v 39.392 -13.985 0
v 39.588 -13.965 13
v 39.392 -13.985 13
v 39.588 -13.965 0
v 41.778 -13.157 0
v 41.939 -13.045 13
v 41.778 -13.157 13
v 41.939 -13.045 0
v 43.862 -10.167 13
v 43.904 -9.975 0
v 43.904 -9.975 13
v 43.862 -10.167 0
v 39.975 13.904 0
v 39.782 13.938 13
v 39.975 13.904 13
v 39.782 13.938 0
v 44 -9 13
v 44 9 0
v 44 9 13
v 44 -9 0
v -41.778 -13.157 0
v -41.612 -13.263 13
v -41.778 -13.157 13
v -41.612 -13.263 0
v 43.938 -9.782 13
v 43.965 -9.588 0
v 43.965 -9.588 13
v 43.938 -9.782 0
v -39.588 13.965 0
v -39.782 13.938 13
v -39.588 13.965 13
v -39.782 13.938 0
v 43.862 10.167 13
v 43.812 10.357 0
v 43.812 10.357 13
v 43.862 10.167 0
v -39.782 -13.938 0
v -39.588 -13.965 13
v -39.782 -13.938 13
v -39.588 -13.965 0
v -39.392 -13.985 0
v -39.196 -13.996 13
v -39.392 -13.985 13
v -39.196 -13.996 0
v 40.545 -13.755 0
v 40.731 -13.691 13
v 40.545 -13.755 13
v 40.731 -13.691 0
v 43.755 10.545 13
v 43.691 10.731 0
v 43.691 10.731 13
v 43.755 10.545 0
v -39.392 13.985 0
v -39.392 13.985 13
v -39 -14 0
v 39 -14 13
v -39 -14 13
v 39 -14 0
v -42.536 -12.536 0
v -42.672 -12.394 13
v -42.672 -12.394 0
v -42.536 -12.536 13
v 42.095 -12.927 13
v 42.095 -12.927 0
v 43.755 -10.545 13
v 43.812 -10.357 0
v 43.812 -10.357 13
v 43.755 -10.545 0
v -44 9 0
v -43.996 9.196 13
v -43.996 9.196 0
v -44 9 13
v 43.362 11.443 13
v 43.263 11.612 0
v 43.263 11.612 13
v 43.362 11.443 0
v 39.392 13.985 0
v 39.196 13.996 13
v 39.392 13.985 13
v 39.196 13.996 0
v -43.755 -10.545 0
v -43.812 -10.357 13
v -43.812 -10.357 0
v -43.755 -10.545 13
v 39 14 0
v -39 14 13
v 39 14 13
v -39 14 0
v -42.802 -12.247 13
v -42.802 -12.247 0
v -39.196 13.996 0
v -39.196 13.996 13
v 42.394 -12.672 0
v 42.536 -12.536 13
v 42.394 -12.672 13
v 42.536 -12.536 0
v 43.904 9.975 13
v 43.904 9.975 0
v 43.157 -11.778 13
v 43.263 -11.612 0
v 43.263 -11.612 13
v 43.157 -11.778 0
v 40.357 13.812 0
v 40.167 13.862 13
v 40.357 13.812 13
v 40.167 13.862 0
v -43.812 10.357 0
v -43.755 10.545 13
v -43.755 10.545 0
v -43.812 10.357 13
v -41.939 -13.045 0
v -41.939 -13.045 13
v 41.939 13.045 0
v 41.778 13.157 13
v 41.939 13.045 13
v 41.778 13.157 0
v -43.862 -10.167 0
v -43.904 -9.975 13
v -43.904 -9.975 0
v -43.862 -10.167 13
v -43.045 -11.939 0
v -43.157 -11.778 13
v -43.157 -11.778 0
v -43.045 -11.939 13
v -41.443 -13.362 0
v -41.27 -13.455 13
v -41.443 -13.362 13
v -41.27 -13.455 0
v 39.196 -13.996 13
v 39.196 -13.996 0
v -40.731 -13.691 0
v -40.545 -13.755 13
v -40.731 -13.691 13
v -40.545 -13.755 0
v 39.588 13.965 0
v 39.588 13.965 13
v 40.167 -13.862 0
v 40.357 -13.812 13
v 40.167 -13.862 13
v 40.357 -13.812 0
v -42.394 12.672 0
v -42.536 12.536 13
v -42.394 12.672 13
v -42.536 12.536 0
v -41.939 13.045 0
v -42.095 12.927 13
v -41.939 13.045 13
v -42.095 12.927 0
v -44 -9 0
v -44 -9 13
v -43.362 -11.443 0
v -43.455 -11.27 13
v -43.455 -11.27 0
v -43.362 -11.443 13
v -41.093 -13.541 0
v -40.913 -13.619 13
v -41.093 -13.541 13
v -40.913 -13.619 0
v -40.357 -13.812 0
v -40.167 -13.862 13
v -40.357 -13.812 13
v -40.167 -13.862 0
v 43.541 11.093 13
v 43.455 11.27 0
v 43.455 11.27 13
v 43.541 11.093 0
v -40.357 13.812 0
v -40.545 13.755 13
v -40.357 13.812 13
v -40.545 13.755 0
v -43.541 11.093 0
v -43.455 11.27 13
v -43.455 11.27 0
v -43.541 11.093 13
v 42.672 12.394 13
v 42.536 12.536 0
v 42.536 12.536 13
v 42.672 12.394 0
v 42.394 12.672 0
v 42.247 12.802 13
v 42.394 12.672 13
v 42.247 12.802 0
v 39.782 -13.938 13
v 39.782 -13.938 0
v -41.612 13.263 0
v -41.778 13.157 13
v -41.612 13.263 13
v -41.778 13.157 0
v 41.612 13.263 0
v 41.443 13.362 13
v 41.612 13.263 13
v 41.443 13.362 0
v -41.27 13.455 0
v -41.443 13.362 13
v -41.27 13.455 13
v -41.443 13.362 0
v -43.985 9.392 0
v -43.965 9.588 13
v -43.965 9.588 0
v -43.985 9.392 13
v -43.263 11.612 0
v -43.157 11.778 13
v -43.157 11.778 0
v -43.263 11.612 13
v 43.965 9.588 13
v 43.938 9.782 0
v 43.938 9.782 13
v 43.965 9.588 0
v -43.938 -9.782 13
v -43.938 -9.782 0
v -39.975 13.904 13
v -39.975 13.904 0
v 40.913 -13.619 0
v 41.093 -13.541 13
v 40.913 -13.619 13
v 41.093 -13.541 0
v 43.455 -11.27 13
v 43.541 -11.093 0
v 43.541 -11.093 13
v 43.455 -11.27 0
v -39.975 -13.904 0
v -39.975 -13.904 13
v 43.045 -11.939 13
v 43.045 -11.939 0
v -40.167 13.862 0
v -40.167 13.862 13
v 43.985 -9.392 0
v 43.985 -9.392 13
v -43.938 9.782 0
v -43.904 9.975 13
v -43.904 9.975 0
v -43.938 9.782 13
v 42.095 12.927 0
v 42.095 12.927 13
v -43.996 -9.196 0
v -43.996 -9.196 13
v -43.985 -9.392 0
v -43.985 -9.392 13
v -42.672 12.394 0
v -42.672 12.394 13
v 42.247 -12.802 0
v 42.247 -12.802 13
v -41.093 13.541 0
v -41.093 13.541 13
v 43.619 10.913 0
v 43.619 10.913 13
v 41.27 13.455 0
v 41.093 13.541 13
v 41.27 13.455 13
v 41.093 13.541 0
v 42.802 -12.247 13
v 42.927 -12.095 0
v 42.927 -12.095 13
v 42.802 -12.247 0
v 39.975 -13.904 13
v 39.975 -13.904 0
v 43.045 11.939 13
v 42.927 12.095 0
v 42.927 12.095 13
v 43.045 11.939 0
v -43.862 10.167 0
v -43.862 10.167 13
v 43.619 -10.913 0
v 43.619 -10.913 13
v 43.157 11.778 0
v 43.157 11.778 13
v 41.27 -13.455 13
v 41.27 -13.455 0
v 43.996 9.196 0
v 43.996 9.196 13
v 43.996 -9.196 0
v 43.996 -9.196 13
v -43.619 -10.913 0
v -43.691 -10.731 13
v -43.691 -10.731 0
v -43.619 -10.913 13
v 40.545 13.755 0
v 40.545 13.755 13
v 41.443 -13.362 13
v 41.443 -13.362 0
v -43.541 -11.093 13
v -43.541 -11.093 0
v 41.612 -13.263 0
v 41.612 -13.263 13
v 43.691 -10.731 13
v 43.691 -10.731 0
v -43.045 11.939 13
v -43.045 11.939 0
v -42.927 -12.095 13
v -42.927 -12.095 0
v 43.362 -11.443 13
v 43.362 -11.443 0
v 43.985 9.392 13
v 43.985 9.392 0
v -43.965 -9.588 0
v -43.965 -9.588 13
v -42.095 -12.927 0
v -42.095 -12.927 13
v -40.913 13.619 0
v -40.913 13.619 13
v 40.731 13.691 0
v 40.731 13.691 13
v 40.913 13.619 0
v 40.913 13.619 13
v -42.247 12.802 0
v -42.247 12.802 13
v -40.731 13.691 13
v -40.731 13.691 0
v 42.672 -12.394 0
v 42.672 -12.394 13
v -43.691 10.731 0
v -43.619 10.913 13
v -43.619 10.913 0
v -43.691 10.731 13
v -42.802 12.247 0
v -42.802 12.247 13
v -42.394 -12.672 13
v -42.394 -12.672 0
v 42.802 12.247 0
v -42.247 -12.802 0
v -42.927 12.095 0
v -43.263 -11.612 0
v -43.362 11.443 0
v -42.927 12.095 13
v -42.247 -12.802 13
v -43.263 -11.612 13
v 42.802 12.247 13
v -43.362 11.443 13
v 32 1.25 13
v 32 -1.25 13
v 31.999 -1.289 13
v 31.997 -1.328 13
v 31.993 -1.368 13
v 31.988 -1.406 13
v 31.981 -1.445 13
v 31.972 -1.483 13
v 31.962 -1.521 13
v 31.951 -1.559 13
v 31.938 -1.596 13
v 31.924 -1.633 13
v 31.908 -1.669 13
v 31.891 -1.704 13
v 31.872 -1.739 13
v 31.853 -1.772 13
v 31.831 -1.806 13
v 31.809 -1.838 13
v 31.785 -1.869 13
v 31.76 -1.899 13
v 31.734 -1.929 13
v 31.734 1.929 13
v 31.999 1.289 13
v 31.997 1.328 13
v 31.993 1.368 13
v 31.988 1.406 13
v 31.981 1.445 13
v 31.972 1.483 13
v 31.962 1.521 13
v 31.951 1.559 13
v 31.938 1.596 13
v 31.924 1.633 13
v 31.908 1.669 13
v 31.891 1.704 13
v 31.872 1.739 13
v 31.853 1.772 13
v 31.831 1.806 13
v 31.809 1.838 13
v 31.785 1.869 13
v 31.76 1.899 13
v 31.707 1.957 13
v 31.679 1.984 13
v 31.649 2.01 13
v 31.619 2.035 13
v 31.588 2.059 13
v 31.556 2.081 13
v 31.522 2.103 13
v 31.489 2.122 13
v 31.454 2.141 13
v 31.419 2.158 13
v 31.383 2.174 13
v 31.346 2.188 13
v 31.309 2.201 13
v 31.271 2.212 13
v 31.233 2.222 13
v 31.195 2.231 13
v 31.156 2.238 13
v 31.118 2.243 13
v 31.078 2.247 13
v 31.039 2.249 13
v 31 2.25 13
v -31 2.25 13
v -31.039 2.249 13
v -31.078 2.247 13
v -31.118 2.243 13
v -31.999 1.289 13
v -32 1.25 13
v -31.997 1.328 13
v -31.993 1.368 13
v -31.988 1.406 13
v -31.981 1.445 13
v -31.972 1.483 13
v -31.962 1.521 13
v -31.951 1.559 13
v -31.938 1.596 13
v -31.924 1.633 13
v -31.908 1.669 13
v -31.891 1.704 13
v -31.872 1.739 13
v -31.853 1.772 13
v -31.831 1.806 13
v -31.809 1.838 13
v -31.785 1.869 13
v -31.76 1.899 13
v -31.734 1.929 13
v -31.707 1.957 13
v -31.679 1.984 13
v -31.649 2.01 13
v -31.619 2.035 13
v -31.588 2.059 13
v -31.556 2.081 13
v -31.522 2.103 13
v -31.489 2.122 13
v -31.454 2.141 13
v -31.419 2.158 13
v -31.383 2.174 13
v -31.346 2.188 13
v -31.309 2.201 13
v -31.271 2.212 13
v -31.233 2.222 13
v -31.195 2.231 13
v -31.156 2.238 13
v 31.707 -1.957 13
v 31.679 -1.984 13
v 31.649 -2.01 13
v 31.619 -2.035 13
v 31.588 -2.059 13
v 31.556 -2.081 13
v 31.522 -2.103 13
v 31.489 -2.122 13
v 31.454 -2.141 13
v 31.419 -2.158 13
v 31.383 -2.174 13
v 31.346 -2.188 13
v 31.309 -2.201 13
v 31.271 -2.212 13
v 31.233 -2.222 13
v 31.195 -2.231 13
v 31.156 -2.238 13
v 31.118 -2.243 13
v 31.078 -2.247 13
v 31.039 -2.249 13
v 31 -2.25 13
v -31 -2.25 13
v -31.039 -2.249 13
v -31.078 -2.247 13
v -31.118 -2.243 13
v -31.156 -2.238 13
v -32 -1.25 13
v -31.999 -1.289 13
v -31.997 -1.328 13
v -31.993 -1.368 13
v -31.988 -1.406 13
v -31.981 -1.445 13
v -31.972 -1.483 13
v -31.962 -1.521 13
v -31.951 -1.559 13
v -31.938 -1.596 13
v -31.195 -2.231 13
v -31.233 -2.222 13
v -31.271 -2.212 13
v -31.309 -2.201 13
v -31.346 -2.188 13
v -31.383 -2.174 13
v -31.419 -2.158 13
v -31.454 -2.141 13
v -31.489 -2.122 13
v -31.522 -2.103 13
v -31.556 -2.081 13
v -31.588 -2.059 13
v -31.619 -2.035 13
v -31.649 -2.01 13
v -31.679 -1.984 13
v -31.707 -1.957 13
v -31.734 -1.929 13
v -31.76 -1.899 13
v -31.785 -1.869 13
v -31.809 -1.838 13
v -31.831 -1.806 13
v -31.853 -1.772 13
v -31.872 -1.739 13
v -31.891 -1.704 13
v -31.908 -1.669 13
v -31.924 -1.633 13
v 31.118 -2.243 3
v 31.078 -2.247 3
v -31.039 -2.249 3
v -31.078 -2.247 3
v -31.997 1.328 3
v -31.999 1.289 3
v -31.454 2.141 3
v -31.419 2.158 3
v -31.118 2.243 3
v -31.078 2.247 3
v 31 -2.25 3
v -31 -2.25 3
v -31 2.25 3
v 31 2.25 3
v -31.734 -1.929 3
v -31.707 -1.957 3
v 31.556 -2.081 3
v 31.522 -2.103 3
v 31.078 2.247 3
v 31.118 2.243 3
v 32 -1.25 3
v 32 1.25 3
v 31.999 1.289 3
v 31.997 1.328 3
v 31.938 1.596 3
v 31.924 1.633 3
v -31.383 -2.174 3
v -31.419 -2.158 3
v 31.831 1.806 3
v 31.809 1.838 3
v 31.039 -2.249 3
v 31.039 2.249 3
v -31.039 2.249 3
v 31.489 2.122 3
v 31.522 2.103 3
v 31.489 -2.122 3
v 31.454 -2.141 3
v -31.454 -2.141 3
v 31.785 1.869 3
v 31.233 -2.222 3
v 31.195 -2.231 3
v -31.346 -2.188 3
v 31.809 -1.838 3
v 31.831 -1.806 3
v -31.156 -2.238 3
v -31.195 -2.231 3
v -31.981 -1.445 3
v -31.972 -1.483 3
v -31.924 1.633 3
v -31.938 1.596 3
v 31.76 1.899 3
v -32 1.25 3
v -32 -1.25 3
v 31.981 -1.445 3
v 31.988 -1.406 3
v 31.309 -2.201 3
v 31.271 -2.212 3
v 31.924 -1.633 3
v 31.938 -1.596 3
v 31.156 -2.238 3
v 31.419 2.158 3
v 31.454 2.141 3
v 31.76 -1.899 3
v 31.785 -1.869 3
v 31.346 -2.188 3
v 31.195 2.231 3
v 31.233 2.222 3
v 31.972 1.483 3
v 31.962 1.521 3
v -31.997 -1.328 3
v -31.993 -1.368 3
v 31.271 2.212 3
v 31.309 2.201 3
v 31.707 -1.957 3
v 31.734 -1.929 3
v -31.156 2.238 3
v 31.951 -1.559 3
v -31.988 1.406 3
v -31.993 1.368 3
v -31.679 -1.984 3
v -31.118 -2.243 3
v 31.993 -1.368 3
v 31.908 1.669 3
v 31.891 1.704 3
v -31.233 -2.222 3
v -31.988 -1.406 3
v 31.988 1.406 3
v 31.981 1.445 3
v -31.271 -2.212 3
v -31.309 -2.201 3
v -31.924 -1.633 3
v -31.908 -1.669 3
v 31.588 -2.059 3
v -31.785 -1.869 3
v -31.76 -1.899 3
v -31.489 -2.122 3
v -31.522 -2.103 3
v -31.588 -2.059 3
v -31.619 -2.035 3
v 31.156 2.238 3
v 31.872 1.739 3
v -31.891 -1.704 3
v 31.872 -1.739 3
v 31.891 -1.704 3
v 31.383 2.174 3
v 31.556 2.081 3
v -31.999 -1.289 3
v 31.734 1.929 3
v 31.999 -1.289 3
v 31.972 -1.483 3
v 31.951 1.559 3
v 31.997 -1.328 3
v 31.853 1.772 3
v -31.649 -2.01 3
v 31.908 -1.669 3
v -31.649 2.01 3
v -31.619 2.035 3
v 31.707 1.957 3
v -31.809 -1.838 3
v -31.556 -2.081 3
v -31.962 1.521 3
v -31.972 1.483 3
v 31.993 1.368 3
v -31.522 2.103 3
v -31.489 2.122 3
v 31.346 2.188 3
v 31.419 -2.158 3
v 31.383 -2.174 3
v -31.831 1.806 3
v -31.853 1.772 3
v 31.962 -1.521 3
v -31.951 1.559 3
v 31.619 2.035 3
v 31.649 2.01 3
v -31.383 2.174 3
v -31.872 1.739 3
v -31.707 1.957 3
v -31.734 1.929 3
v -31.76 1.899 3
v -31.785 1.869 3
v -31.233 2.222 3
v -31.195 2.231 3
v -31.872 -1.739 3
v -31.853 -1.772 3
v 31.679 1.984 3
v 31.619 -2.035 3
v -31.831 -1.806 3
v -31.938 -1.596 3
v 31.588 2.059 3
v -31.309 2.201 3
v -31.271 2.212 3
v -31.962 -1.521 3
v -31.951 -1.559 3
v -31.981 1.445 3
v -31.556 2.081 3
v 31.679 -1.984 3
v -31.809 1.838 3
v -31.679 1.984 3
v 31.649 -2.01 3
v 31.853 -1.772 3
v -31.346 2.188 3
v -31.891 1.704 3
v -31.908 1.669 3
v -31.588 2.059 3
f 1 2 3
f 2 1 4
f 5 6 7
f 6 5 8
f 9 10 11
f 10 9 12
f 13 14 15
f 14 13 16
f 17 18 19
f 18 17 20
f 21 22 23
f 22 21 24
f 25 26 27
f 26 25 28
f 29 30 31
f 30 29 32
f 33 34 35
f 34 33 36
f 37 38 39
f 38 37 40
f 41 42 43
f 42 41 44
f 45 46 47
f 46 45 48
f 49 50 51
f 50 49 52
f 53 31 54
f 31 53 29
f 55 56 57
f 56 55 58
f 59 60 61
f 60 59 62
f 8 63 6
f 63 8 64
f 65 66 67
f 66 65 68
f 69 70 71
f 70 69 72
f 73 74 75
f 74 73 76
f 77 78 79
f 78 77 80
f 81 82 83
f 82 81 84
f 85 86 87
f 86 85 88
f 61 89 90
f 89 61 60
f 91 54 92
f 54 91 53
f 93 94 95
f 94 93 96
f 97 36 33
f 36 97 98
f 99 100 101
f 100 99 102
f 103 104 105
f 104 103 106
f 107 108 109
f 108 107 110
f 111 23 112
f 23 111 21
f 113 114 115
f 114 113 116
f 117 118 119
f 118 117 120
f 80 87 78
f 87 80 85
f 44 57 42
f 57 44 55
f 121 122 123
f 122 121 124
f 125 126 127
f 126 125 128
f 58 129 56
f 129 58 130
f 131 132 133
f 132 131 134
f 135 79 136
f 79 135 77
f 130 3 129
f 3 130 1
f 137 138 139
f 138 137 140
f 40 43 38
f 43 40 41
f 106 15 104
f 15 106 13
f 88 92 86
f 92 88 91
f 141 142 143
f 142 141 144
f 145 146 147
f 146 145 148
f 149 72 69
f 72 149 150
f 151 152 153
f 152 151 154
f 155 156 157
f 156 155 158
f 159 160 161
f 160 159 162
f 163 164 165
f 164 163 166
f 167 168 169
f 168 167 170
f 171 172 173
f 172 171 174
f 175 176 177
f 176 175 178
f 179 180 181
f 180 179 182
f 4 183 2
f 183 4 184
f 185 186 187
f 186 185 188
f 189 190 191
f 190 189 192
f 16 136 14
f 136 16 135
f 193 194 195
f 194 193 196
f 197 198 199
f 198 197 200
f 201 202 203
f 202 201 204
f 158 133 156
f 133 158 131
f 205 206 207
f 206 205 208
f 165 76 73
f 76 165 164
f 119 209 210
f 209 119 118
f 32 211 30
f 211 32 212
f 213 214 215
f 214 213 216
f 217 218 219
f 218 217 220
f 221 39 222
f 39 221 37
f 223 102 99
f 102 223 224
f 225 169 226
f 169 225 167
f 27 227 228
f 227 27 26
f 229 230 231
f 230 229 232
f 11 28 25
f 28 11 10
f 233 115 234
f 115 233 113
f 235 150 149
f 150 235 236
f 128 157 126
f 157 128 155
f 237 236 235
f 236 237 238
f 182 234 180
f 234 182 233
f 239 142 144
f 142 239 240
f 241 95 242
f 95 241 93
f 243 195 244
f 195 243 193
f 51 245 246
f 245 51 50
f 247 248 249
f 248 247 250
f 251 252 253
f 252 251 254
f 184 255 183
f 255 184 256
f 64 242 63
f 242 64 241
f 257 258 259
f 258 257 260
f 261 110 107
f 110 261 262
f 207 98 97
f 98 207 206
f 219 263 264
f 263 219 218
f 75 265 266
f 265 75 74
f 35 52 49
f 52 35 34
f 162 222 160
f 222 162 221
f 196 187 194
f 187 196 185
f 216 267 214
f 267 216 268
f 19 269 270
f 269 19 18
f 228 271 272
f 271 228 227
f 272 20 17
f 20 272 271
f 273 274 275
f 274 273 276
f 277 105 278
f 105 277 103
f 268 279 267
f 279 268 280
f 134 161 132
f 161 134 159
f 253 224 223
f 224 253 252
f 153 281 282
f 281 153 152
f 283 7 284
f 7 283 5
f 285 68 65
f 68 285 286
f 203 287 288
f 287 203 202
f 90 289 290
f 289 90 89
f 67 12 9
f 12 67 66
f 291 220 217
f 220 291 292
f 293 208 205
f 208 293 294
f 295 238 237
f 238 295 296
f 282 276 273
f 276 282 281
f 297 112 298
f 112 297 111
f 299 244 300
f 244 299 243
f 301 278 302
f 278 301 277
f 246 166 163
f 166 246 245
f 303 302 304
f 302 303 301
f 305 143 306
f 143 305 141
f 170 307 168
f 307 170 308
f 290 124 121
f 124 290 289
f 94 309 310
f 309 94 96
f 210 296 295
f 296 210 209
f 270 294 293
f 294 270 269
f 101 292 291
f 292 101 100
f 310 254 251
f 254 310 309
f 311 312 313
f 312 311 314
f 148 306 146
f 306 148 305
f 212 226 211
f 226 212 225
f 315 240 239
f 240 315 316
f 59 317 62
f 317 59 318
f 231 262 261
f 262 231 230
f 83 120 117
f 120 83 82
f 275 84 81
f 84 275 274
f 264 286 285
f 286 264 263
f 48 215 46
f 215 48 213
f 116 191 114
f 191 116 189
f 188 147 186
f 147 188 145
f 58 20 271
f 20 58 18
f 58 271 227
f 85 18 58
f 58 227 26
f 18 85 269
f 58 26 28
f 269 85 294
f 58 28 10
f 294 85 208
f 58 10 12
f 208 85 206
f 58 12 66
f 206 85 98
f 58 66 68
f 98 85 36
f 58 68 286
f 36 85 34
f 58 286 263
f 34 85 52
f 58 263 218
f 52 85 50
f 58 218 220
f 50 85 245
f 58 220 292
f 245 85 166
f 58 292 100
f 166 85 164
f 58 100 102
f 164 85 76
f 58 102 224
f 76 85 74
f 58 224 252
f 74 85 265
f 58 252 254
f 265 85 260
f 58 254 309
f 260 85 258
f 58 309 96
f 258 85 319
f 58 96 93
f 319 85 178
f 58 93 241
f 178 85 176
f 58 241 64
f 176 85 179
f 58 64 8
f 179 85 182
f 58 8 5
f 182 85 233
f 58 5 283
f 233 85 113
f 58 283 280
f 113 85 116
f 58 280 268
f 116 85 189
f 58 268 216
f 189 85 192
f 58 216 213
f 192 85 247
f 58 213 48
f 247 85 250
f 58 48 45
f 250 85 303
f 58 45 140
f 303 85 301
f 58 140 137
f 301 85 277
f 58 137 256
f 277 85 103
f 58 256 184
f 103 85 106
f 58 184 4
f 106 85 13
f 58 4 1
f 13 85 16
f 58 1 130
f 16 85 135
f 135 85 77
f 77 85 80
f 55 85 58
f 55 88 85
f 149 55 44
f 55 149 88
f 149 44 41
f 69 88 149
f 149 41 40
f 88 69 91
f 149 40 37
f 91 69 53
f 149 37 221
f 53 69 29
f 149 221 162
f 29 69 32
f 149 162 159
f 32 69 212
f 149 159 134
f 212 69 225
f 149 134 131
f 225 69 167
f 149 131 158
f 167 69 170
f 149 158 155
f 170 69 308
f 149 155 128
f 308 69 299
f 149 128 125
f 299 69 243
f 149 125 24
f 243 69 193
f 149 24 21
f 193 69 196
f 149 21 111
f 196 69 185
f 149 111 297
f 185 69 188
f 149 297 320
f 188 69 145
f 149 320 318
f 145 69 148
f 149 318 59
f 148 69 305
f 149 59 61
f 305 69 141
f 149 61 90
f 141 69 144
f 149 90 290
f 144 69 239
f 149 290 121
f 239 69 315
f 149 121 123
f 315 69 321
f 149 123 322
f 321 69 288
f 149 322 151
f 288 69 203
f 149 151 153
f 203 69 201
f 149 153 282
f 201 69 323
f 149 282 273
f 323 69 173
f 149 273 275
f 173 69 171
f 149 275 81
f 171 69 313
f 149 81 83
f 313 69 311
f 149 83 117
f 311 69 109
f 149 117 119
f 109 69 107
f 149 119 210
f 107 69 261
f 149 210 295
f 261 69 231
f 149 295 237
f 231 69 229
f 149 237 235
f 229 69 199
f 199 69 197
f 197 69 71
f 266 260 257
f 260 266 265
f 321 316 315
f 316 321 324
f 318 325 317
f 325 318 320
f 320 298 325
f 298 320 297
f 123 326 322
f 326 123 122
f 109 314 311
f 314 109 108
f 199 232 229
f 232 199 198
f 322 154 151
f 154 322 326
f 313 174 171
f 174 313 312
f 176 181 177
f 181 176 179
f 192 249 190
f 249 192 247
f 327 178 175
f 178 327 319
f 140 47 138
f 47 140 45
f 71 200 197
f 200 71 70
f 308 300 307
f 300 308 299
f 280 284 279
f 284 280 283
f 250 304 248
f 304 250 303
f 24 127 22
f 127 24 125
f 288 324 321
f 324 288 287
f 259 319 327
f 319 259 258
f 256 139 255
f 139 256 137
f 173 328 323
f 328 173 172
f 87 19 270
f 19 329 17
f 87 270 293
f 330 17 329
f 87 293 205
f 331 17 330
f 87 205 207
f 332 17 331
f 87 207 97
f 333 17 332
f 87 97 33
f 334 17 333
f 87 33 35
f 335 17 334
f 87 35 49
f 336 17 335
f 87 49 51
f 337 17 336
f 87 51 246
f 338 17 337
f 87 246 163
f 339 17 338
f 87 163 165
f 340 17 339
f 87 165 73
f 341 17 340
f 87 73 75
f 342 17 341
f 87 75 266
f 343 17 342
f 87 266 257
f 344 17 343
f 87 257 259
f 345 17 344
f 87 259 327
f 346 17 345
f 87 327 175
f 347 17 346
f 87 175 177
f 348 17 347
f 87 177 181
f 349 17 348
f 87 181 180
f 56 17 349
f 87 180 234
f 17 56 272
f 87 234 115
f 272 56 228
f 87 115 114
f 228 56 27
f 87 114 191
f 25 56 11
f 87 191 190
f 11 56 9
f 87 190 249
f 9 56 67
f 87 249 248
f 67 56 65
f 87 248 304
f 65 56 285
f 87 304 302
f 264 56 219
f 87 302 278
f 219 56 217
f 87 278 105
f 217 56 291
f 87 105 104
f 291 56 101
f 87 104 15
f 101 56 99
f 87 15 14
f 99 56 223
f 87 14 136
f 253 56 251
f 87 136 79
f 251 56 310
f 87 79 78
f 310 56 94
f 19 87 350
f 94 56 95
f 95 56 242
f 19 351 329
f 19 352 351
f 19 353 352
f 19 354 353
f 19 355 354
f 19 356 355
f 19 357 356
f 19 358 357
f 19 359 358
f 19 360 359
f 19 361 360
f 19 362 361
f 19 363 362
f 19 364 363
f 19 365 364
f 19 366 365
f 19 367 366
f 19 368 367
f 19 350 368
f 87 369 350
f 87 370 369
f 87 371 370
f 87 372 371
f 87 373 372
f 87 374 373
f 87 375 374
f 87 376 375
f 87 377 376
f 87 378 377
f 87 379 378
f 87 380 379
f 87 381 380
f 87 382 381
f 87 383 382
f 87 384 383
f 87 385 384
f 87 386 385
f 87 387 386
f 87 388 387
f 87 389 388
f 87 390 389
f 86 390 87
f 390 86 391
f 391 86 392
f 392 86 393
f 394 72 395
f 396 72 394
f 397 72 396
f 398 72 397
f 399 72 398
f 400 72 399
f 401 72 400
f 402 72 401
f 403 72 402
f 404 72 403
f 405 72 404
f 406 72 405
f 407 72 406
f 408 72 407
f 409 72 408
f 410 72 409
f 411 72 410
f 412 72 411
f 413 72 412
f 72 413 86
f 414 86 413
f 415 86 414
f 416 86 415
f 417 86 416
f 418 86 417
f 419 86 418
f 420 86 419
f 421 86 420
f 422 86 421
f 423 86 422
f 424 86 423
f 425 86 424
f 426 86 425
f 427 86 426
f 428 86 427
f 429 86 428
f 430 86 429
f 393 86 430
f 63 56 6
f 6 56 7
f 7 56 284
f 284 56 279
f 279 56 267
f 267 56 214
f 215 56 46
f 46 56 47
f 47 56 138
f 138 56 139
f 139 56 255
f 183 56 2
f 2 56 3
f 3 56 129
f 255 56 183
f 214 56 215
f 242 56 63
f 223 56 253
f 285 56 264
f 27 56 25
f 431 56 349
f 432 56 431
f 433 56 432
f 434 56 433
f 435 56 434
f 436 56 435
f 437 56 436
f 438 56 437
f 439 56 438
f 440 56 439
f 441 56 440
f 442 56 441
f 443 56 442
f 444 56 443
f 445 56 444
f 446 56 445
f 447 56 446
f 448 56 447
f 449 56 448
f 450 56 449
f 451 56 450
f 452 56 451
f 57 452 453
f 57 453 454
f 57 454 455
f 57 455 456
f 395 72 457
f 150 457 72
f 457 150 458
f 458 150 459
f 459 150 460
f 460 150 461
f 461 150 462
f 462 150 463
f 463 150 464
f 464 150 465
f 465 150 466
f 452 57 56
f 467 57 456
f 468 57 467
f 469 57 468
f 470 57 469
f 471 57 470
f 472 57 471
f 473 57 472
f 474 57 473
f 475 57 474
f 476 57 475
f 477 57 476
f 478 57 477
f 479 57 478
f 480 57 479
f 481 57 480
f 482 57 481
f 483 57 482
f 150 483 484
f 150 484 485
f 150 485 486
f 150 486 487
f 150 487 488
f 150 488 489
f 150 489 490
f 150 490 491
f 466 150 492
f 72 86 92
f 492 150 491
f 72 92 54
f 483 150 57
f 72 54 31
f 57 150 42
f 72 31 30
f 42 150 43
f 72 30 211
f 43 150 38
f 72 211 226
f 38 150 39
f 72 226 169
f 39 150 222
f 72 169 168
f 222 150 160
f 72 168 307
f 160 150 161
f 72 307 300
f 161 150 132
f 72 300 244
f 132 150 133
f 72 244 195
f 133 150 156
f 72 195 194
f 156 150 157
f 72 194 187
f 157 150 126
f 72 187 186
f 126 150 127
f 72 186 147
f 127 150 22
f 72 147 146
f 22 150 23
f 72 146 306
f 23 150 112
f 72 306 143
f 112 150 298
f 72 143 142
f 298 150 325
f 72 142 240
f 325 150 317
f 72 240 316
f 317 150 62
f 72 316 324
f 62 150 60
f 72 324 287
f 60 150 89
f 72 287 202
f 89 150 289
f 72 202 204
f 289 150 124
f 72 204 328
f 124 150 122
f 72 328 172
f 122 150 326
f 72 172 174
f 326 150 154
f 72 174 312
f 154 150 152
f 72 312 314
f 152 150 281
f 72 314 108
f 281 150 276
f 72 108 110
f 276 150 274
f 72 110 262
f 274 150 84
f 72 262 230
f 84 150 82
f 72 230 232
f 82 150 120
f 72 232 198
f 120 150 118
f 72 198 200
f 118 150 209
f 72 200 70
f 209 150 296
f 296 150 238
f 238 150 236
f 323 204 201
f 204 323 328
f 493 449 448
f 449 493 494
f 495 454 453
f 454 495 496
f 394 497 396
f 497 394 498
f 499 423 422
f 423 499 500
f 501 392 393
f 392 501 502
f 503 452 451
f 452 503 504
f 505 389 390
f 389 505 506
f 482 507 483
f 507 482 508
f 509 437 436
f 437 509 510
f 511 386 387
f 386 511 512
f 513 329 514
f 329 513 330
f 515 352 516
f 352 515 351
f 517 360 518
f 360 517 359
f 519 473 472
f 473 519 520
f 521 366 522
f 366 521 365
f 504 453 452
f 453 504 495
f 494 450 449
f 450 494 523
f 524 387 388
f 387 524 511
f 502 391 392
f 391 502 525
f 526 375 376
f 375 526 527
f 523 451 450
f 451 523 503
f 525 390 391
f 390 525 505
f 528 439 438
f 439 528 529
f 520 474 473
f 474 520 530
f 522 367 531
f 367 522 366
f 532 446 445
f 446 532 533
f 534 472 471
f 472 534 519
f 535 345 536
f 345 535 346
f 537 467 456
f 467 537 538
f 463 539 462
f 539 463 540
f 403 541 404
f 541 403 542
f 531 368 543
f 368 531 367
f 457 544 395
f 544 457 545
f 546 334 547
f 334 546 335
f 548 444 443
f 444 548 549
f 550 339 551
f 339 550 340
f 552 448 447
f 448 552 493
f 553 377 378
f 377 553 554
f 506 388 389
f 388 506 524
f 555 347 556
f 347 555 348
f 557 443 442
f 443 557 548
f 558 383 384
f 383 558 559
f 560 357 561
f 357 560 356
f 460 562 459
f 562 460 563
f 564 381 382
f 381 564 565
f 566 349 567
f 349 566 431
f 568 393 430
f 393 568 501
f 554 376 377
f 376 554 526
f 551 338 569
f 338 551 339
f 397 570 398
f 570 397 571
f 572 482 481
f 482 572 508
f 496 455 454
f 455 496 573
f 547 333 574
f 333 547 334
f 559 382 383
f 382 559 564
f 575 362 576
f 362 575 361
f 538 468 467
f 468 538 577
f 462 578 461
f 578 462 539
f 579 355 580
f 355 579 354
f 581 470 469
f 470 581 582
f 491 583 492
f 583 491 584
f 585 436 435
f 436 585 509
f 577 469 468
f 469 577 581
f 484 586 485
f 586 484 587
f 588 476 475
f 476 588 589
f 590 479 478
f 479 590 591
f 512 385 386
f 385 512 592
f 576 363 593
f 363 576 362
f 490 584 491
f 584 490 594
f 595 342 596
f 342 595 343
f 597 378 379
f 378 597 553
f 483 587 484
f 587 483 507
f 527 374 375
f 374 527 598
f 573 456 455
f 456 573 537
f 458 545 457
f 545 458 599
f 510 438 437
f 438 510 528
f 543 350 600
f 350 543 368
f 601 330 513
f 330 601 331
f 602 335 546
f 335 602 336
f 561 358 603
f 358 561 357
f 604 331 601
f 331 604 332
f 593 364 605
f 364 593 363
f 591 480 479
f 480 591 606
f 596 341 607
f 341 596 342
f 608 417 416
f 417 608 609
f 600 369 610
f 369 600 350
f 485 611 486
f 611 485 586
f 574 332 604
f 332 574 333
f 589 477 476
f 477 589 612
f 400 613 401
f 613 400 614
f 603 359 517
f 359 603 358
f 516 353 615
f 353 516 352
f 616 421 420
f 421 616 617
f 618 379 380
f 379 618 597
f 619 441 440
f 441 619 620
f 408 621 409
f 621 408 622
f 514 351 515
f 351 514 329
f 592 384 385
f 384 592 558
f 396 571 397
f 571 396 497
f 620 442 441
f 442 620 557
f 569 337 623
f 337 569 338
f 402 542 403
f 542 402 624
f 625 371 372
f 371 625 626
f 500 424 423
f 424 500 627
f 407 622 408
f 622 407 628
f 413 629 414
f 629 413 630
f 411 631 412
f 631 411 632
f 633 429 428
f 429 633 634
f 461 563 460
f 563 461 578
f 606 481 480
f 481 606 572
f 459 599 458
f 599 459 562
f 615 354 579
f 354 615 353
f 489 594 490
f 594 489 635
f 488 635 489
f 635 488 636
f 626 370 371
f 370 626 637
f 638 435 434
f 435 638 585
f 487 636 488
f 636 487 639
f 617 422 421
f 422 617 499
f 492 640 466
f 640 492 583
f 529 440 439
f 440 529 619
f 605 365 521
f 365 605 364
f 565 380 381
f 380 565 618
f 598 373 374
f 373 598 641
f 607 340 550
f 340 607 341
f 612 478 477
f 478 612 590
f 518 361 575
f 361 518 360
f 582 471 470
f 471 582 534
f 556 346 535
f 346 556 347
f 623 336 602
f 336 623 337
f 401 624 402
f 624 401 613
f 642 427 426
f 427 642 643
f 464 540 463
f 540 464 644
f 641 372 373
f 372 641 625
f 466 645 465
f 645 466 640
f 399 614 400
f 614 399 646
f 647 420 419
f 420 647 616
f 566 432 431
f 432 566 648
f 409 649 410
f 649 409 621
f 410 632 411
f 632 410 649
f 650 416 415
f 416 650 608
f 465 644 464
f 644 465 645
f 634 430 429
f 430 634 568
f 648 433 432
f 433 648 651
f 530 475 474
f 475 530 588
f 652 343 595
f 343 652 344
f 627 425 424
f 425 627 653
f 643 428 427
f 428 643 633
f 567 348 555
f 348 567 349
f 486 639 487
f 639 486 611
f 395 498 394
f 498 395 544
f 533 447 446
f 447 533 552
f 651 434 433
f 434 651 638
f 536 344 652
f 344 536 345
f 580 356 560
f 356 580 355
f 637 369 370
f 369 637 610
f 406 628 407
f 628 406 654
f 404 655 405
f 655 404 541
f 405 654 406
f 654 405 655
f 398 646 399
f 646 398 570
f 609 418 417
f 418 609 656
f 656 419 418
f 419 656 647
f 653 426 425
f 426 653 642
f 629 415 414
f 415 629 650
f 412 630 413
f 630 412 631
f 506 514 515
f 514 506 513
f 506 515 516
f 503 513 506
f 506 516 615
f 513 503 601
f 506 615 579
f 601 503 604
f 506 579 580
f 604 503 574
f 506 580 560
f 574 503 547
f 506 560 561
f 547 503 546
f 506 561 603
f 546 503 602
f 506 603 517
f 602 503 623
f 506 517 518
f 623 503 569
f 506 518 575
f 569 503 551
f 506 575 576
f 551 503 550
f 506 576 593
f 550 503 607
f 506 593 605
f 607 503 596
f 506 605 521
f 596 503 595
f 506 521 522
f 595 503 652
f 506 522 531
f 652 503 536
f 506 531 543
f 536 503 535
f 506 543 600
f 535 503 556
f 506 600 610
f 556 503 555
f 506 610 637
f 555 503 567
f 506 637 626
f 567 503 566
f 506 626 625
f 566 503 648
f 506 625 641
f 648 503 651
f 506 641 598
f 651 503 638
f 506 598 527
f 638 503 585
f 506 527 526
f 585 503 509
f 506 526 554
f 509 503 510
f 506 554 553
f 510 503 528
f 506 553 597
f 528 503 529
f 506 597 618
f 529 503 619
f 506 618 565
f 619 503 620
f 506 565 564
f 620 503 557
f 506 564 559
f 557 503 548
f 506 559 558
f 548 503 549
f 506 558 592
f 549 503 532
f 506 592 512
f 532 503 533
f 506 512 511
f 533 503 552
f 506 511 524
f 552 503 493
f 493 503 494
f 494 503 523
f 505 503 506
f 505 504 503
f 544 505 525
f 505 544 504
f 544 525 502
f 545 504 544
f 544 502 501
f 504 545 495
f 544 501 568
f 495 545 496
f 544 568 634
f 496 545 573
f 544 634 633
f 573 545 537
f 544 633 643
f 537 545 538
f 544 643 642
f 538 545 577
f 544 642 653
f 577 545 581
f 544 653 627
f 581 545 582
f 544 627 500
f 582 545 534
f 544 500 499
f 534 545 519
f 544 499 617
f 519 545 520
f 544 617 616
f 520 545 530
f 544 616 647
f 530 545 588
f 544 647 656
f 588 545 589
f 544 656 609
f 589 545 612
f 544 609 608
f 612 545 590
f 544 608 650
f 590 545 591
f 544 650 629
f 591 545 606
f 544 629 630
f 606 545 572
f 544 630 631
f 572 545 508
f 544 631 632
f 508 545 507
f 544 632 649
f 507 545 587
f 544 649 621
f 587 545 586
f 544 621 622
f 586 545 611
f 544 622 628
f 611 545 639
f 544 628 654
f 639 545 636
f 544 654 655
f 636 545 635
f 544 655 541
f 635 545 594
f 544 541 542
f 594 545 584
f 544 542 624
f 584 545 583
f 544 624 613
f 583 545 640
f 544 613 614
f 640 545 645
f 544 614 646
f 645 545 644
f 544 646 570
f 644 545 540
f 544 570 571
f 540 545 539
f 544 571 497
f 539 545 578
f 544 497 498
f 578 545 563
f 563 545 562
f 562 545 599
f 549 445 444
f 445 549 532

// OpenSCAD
// The Olympus — Desk stand
// Desk stand — A slotted foot that holds a medallion or lithophane upright on a desk or shelf.
//
// Parametric source for OpenSCAD 2021.01 or later. Change the values below
// (or use Window → Customizer), then Design → Render and File → Export → STL.
// Print flat, design up, no supports.

/* [Dimensions] */
diameter = 100;           // [40:1:300] Medallion diameter (mm)
slot = 4.2;               // [1.6:0.1:16] Medallion thickness (mm)
clearance = 0.3;          // [0:0.05:1] Clearance (mm)
depth = 10;               // [4:0.5:30] Slot depth (mm)

/* [Hidden] */
$fn = 160;

slot_w = slot + clearance;
r0 = diameter / 2;
chord = 2 * sqrt(max(0, r0 * r0 - pow(r0 - depth, 2)));
slot_l = chord + 4;
length = slot_l + 24;
width = max(28, slot_w + 20);
floor_h = 3;

module rounded(l, w, r) offset(r = r) square([l - 2 * r, w - 2 * r], center = true);

difference() {
  linear_extrude(floor_h + depth) rounded(length, width, 5);
  translate([0, 0, floor_h]) linear_extrude(depth + 0.01) rounded(slot_l, slot_w, min(slot_w / 2 - 0.01, 1));
}
